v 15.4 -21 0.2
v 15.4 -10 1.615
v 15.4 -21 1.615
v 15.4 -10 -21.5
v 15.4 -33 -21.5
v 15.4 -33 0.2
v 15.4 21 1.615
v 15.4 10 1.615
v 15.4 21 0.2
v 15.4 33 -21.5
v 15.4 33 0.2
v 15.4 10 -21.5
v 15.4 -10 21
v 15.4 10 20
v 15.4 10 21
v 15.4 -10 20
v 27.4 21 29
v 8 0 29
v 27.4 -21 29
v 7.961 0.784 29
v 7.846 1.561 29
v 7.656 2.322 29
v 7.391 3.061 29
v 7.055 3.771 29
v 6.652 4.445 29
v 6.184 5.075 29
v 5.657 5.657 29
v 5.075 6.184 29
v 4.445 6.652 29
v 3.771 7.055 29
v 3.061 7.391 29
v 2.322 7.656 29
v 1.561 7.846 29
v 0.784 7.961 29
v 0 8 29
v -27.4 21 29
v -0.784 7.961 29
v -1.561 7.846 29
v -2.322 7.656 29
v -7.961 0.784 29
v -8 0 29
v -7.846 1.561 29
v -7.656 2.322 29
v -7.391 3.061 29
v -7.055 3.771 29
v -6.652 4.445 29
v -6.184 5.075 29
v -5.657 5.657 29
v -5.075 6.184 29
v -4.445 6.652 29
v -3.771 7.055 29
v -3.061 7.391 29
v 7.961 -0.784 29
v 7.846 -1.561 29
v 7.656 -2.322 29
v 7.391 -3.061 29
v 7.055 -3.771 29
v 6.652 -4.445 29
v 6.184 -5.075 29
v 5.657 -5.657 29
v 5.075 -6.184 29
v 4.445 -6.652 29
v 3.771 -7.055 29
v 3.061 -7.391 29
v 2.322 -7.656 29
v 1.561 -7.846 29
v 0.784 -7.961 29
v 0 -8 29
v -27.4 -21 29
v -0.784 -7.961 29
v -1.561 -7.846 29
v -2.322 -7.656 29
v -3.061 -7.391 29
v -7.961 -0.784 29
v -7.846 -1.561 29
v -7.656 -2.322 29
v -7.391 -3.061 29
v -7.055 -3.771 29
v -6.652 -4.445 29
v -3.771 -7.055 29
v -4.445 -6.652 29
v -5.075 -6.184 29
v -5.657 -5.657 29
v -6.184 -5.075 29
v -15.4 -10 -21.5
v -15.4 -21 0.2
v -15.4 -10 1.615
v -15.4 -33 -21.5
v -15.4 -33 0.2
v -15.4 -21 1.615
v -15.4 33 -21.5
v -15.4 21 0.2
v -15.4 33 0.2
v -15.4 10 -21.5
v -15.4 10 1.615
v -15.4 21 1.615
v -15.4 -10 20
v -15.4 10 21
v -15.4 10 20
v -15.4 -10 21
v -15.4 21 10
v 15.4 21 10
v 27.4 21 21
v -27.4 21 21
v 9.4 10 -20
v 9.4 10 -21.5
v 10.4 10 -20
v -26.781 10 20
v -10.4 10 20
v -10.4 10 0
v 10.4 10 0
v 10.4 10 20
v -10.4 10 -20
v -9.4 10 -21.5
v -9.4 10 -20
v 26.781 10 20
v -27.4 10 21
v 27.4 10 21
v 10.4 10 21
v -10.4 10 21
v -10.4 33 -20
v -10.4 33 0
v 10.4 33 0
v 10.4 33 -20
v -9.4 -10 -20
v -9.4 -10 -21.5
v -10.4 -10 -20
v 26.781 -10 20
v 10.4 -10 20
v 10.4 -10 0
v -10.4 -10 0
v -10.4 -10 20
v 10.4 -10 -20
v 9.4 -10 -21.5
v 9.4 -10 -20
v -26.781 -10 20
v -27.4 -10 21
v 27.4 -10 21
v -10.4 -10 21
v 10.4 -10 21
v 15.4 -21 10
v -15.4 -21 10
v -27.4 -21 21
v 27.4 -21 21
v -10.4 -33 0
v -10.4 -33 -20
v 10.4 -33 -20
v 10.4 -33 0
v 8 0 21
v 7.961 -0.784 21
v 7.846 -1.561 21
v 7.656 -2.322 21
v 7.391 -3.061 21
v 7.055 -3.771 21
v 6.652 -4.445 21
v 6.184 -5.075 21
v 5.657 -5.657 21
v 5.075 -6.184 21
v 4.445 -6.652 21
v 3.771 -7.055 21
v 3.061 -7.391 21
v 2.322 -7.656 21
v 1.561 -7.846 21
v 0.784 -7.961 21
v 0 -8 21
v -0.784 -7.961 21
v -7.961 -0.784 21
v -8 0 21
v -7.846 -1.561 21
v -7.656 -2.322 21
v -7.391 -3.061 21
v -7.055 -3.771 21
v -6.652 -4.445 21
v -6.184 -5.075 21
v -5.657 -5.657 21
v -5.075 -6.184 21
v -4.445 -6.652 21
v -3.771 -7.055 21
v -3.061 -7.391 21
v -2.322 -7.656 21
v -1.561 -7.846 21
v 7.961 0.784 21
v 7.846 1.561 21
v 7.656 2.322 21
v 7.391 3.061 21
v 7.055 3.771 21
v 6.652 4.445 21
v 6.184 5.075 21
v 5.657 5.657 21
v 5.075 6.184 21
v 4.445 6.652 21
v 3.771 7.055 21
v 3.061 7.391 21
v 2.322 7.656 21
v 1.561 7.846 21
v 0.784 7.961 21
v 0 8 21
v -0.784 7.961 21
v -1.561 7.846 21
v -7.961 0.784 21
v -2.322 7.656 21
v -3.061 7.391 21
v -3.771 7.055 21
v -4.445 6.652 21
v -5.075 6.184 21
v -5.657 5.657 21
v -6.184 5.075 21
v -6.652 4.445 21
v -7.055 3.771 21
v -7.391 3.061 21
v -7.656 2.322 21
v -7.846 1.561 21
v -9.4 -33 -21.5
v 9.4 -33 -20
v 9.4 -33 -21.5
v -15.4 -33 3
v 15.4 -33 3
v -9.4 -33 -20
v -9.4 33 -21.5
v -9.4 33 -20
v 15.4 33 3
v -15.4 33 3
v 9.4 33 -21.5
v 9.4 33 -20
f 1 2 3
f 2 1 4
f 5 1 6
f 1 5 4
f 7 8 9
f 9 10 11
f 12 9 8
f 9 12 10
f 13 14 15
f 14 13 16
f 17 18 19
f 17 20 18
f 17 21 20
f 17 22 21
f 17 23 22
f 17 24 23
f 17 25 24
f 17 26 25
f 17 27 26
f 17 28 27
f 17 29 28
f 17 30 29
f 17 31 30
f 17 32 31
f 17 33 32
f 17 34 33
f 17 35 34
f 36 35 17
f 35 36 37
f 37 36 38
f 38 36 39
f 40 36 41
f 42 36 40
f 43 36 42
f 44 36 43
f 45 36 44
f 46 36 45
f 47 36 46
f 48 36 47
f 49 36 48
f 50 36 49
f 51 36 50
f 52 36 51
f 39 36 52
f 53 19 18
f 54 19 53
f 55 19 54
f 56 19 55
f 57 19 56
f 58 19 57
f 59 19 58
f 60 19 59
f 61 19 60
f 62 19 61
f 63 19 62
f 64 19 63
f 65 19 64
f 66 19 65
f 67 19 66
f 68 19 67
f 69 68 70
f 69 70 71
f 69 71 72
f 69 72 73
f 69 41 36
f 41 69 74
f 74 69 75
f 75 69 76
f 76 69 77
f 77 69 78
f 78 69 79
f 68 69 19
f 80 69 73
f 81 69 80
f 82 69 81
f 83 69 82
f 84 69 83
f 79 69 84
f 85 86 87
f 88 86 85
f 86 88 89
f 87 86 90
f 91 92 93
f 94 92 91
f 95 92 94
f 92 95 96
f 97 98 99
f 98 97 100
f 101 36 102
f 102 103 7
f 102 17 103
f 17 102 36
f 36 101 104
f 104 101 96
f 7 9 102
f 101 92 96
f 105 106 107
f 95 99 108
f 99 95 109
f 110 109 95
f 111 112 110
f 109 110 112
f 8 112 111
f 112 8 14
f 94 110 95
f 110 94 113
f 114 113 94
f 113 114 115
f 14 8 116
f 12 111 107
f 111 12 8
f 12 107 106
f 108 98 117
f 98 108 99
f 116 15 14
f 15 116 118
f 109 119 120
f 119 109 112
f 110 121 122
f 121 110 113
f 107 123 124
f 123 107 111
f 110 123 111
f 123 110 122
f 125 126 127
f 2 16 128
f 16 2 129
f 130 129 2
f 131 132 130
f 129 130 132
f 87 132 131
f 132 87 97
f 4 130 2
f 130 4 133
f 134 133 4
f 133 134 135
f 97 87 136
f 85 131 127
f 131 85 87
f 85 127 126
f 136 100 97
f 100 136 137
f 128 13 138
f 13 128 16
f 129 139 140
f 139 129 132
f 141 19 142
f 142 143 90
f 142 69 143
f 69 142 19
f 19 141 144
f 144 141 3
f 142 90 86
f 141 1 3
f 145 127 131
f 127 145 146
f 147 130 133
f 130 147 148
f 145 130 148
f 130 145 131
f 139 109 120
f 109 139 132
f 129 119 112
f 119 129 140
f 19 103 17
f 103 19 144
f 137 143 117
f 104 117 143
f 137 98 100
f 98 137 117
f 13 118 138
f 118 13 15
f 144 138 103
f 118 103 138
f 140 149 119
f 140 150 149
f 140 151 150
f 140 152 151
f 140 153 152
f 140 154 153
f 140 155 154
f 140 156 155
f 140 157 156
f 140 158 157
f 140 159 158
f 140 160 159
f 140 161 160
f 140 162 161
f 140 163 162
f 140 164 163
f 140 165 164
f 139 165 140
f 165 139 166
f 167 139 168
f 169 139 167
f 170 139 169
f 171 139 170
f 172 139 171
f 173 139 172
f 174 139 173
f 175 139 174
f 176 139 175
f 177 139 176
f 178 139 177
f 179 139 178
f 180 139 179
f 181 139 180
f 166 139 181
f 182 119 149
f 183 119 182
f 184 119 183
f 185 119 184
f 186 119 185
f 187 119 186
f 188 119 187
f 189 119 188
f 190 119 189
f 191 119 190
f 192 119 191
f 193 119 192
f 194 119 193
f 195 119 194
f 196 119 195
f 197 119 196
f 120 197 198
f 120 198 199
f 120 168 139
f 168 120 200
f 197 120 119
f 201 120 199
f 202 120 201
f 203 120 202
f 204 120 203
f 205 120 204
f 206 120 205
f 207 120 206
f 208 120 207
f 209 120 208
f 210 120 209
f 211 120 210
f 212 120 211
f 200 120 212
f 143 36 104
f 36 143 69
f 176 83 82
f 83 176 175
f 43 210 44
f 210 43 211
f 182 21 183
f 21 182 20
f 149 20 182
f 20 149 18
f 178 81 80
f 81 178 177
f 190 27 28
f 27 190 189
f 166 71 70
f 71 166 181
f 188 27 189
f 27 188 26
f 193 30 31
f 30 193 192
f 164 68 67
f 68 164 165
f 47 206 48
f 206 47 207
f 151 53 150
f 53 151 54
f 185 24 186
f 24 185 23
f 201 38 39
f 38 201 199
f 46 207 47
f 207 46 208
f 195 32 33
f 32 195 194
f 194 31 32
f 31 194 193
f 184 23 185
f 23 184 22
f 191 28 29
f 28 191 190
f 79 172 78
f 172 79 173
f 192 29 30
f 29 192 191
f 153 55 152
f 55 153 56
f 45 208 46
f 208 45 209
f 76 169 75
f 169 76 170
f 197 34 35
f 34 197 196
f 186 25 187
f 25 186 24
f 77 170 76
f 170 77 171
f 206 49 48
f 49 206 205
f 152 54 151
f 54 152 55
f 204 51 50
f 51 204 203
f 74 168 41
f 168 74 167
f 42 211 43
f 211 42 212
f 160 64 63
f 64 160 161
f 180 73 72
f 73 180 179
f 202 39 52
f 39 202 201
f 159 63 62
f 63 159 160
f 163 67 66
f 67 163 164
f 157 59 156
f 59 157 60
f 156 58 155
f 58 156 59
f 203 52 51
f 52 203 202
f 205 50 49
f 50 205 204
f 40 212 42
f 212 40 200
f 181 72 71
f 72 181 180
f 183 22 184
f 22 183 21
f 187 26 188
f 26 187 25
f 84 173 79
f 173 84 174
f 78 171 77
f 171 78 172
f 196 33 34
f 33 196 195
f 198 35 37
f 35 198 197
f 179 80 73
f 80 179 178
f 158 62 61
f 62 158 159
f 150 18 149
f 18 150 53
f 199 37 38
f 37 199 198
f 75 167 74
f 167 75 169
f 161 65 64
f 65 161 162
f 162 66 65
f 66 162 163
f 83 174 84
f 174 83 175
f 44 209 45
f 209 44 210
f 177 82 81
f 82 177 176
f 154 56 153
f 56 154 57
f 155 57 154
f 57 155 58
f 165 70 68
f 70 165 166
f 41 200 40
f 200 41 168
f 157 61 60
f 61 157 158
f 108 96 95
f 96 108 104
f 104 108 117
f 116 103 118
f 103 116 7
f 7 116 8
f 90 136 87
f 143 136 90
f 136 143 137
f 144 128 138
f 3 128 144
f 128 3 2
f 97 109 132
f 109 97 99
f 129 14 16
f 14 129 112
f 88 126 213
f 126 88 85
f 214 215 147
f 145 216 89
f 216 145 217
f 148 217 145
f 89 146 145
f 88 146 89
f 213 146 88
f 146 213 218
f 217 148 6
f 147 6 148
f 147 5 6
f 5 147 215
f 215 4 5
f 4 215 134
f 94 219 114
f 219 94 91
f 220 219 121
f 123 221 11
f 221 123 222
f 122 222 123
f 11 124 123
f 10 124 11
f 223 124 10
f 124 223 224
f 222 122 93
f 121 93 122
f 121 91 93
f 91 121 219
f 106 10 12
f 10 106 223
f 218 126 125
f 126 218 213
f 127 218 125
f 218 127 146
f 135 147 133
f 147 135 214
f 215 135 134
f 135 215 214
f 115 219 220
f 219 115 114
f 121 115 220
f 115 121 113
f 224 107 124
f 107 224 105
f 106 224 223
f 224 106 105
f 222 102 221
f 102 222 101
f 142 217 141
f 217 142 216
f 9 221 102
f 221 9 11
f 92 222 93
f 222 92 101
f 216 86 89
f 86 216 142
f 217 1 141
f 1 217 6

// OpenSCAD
// file: ../perpendicular-u-joint-guard-v1.3-triangular-corner-fills/candidate_triangular_corner_fills.scad
// Candidate v1.3: four triangular concave-corner fill blocks.
//
// Base: accepted v0.7 eaves12 geometry. v0.9/v1.0/v1.1/v1.2 are not
// imported. Each corner block is a real triangular prism: broad at the roof,
// tapering continuously toward z=0, and overlapping the U side wall.

use <../perpendicular-u-joint-guard-v0.7/perpendicular_double_u_guard.scad>;

$fn = 48;
PART = "candidate_iso";

// Explicit v0.7 interface values.
roof_x_outer = 27.4;       // accepted eaves12 roof: -27.4..+27.4
side_wall_x_outer = 15.4;  // existing side-wall outer edge
blue_tube_x_outer = 10.0;  // blue lower 20x20 tube half-width
plate_y_inner = 10.0;
plate_y_outer = 21.0;
plate_depth_y = plate_y_outer - plate_y_inner; // 11 mm per front/back U plate

// The top edge is 0.5 mm inside the roof volume (roof underside z=21), and
// the lower point enters the side wall by 1 mm in X.  The XZ area therefore
// has positive overlap at both ends, not edge-only contact.
triangle_top_z = 21.5;
triangle_bottom_z = 0.0;
triangle_roof_overlap_z = triangle_top_z - 21.0;
triangle_side_overlap_x = 1.0;
triangle_inner_x = side_wall_x_outer - triangle_side_overlap_x; // 14.4

// Bottom retaining-hook contract copied from v0.7 for explicit verification.
hook_height_z = 1.5;
u_bottom_z = -21.0;
hook_top_z = u_bottom_z + hook_height_z; // -19.5

assert(plate_depth_y == 11, "每个三角块的前后板深必须是 11 mm");
assert(triangle_top_z > 21 && triangle_bottom_z == 0,
       "三角块上端必须搭入屋檐、下端落到 z=0");
assert(triangle_inner_x > blue_tube_x_outer,
       "三角块下端不得进入蓝色方管 x=-10..+10 包络");
assert(triangle_side_overlap_x > 0 && triangle_roof_overlap_z > 0,
       "三角块必须与屋檐和侧墙都有正重叠");
assert(hook_height_z == 1.5 && u_bottom_z == -21 && hook_top_z == -19.5,
       "底部卡脚必须保持 z=-21..-19.5");

// A polygon in XZ is extruded only through the corresponding front/back U
// plate. The center y=-10..+10 passage remains open.
module triangular_fill_xz(points, yc) {
    translate([0, yc, 0])
        rotate([90, 0, 0])
            linear_extrude(height = plate_depth_y,
                           center = true,
                           convexity = 10)
                polygon(points = points);
}

module front_neg_x_triangle() {
    // -X roof end -> +X inward. Top wide, lower point at the side wall.
    triangular_fill_xz([
        [-roof_x_outer, 21.0],
        [-triangle_inner_x, triangle_top_z],
        [-triangle_inner_x, triangle_bottom_z]
    ], (plate_y_inner + plate_y_outer) / 2);
}

module front_pos_x_triangle() {
    // +X roof end -> -X inward. Mirrored triangle.
    triangular_fill_xz([
        [roof_x_outer, 21.0],
        [triangle_inner_x, triangle_top_z],
        [triangle_inner_x, triangle_bottom_z]
    ], (plate_y_inner + plate_y_outer) / 2);
}

module back_neg_x_triangle() {
    triangular_fill_xz([
        [-roof_x_outer, 21.0],
        [-triangle_inner_x, triangle_top_z],
        [-triangle_inner_x, triangle_bottom_z]
    ], -(plate_y_inner + plate_y_outer) / 2);
}

module back_pos_x_triangle() {
    triangular_fill_xz([
        [roof_x_outer, 21.0],
        [triangle_inner_x, triangle_top_z],
        [triangle_inner_x, triangle_bottom_z]
    ], -(plate_y_inner + plate_y_outer) / 2);
}

module front_two_triangular_fills() {
    union() {
        front_neg_x_triangle();
        front_pos_x_triangle();
    }
}

module back_two_triangular_fills() {
    union() {
        back_neg_x_triangle();
        back_pos_x_triangle();
    }
}

module all_four_triangular_fills() {
    union() {
        front_two_triangular_fills();
        back_two_triangular_fills();
    }
}

module candidate_print_solid() {
    // Final hole operation is deliberately after the complete four-block
    // union; this preserves a true Z through-hole and the round nut pocket.
    difference() {
        union() {
            double_u_clip();
            all_four_triangular_fills();
        }
        vertical_screw_relief();
    }
}

module candidate_clip() {
    candidate_print_solid();
}

module candidate_assembly_iso() {
    upper_long_tube();
    lower_cross_tube();
    color([0.96, 0.39, 0.08]) double_u_clip();
    color([0.86, 0.13, 0.08]) front_two_triangular_fills();
    color([0.62, 0.12, 0.52]) back_two_triangular_fills();
    vertical_joint_screw();
}

module candidate_front_xz() {
    lower_cross_tube();
    color([0.96, 0.39, 0.08]) double_u_clip();
    color([0.86, 0.13, 0.08]) front_two_triangular_fills();
    vertical_joint_screw();
}

module candidate_back_xz() {
    lower_cross_tube();
    color([0.96, 0.39, 0.08]) double_u_clip();
    color([0.62, 0.12, 0.52]) back_two_triangular_fills();
    vertical_joint_screw();
}

module candidate_top_slice() {
    // At z=-0.5..2.5 the four blocks show their two front/back 11 mm bands;
    // the blue tube and the central y gap remain visible.
    slice_box = 200;
    color([0.28, 0.45, 0.78])
        intersection() {
            lower_cross_tube();
            translate([-slice_box / 2, -slice_box / 2, -0.5])
                cube([slice_box, slice_box, 3.0]);
        }
    color([0.96, 0.39, 0.08])
        intersection() {
            double_u_clip();
            translate([-slice_box / 2, -slice_box / 2, -0.5])
                cube([slice_box, slice_box, 3.0]);
        }
    color([0.86, 0.13, 0.08])
        intersection() {
            front_two_triangular_fills();
            translate([-slice_box / 2, -slice_box / 2, -0.5])
                cube([slice_box, slice_box, 3.0]);
        }
    color([0.62, 0.12, 0.52])
        intersection() {
            back_two_triangular_fills();
            translate([-slice_box / 2, -slice_box / 2, -0.5])
                cube([slice_box, slice_box, 3.0]);
        }
}

module candidate_hole_section() {
    // Center y=0 section: the bore and round nut pocket are shown without
    // confusing them with the bottom hook, which is outside this section.
    intersection() {
        candidate_print_solid();
        translate([-100, -0.4, -100]) cube([200, 0.8, 200]);
    }
}

module candidate_hook_check() {
    // Isolated lower detail: exact imported v0.7 U plate and blue tube, with
    // hook volumes highlighted only for review. This is not the print union.
    detail_box = 200;
    detail_z0 = -22;
    detail_h = 5;
    detail_y0 = 8;
    detail_ydepth = 15;
    intersection() {
        lower_cross_tube();
        translate([-detail_box / 2, detail_y0, detail_z0])
            cube([detail_box, detail_ydepth, detail_h]);
    }
    color([0.96, 0.39, 0.08])
        intersection() {
            u_plate(plate_y_inner, plate_y_outer);
            translate([-detail_box / 2, detail_y0, detail_z0])
                cube([detail_box, detail_ydepth, detail_h]);
        }
    color([0.20, 0.78, 0.20])
        intersection() {
            union() {
                translate([-13.65, 15.5, -20.25])
                    cube([3.5, 11, 1.5], center = true);
                translate([13.65, 15.5, -20.25])
                    cube([3.5, 11, 1.5], center = true);
            }
            translate([-detail_box / 2, detail_y0, detail_z0])
                cube([detail_box, detail_ydepth, detail_h]);
        }
}

if (PART == "candidate_clip") {
    candidate_clip();
} else if (PART == "candidate_front_xz") {
    candidate_front_xz();
} else if (PART == "candidate_back_xz") {
    candidate_back_xz();
} else if (PART == "candidate_top_slice") {
    candidate_top_slice();
} else if (PART == "candidate_hole_section") {
    candidate_hole_section();
} else if (PART == "candidate_hook_check") {
    candidate_hook_check();
} else {
    candidate_assembly_iso();
}
// file: ../perpendicular-u-joint-guard-v1.8-lower-20plus1p5/lower_20plus1p5_guard.scad
// v1.8, mm. Rebuild the WHOLE lower U profile to the explicit 20+1.5 rule.
// Physical blue tube z=-20..0; contact wall height=20; inward lip below it
// z=-21.5..-20. No legacy u_bottom=-21 / lip top=-19.5 in the rebuilt lower.
use <../perpendicular-u-joint-guard-v1.5-vertical-tube-clearance/vertical_tube_clearance_guard.scad>;
use <../perpendicular-u-joint-guard-v1.4-full-nut-passage/full_nut_passage_guard.scad>;

$fn=48;
tube_size=20;
tube_top_z=0;
tube_bottom_z=tube_top_z-tube_size; // -20
lip_thickness_z=1.5;
lower_bottom_z=tube_bottom_z-lip_thickness_z; // -21.5
wall_thickness_x=5;
u_clearance_x=0.8;
inner_width_x=tube_size+u_clearance_x; // 20.8
outer_width_x=inner_width_x+2*wall_thickness_x; // 30.8
hook_depth_x=3.5;
u_inner_y=10;
u_outer_y=33; // original 21 + 12 mm along BLUE tube Y
upper_joint_overlap_z=0.1;

assert(tube_top_z-lower_bottom_z==21.5, "下部总高应为20+1.5=21.5 mm");
assert(2*u_inner_y==20, "中央Y通道应保持20 mm");

module upper_v1_5_preserved() {
    // Keep the accepted upper body. The 0.1 mm overlap is entirely within
    // the original arm footprint, ensuring a solid join without changing
    // the final upper shape or extending the new Y segments above z=0.
    intersection() {
        guard_v1_5();
        translate([-60,-60,-upper_joint_overlap_z])
            cube([120,120,70]);
    }
}

module lower_u_hooks() {
    // Same hook_depth_x, wall and X-clearance logic as the source v0.7 U.
    // Only Z is deliberately corrected to the new user's 20+1.5 definition.
    hook_xc=outer_width_x/2-wall_thickness_x/2-hook_depth_x/2; // 11.15
    for(yc=[-(u_inner_y+u_outer_y)/2,(u_inner_y+u_outer_y)/2])
        for(s=[-1,1])
            translate([s*hook_xc,yc,tube_bottom_z-lip_thickness_z/2])
                cube([hook_depth_x,u_outer_y-u_inner_y,lip_thickness_z],center=true);
}

module rebuilt_lower_u_pair() {
    wall_xc=inner_width_x/2+wall_thickness_x/2; // 12.9
    for(yc=[-(u_inner_y+u_outer_y)/2,(u_inner_y+u_outer_y)/2])
        for(s=[-1,1])
            translate([s*wall_xc,yc,(lower_bottom_z+tube_top_z)/2])
                cube([wall_thickness_x,u_outer_y-u_inner_y,
                      tube_top_z-lower_bottom_z],center=true);
    lower_u_hooks();
}

module guard_v1_8() {
    difference() {
        union() {
            upper_v1_5_preserved();
            rebuilt_lower_u_pair();
        }
        full_depth_nut_passage();
        upper_pipe_vertical_entry_slot();
    }
}

guard_v1_8();
// file: ../perpendicular-u-joint-guard-v1.4-full-nut-passage/full_nut_passage_guard.scad
// v1.4: keep the exact v1.3 body; remove the nut-pocket floor with one
// full-depth Ø16 cylindrical subtraction. Units: mm; Z positive upwards.
// Imported v1.3 geometry contains all four triangles and the lower hooks.
use <../perpendicular-u-joint-guard-v1.3-triangular-corner-fills/candidate_triangular_corner_fills.scad>;

$fn = 48;
PART = "clip";
nut_passage_d = 16.0;

module full_depth_nut_passage() {
    // Cutter extends z=-31..39, past the whole printed z=-21..29 envelope.
    // 64 facets match the existing Ø16 pocket, avoiding a stepped profile.
    translate([0, 0, 4])
        cylinder(d = nut_passage_d, h = 70, center = true, $fn = 64);
}

module guard_v1_4() {
    difference() {
        candidate_print_solid();
        full_depth_nut_passage();
    }
}

guard_v1_4();
// file: ../perpendicular-u-joint-guard-v1.5-vertical-tube-clearance/vertical_tube_clearance_guard.scad
// v1.5: v1.4 Ø16 full nut passage + minimum downward-entry upper-tube slot.
// Units mm. X: upper long tube; Y: blue foot/front-back; Z: up.
use <../perpendicular-u-joint-guard-v1.4-full-nut-passage/full_nut_passage_guard.scad>;

$fn = 48;

module upper_pipe_vertical_entry_slot() {
    // Fixed gray upper tube: x=-60..60, y=-10..10, z=0..20.
    // While the clip moves down, that tube sweeps upward in clip coordinates.
    // A bottom-open slot ending at z=20 covers its whole relevant sweep in
    // the printed z=-21..29 envelope. Roof underside remains at z=21.
    // Preserve exact 20 mm Y width rather than silently adding fit clearance.
    translate([-60, -10, -31]) cube([120, 20, 51]);
}

module guard_v1_5() {
    difference() {
        guard_v1_4();
        upper_pipe_vertical_entry_slot();
    }
}

guard_v1_5();
// file: ../perpendicular-u-joint-guard-v1.9-mirrored-end-ramps/mirrored_end_ramps_guard.scad
// v1.9, mm: two Y-mirrored solid end ramps on the accepted v1.8 lower U.
// Blue tube top is z=0; ramp root |y|=21 rises 10 mm, tip |y|=33 rises 3 mm.
use <../perpendicular-u-joint-guard-v1.8-lower-20plus1p5/lower_20plus1p5_guard.scad>;
use <../perpendicular-u-joint-guard-v1.5-vertical-tube-clearance/vertical_tube_clearance_guard.scad>;
use <../perpendicular-u-joint-guard-v1.4-full-nut-passage/full_nut_passage_guard.scad>;

$fn=48;
ramp_root_y=21;
ramp_tip_y=33;
ramp_root_z=10;
ramp_tip_z=3;
u_inner_half_x=10.4; // v1.8 X inner width 20.8
ramp_sidewall_overlap_x=1;
ramp_half_x=u_inner_half_x+ramp_sidewall_overlap_x; // 11.4 / width 22.8
ramp_root_overlap_y=0.2;
ramp_joint_overlap_z=0.2;

module positive_end_ramp_prism() {
    // Local XY polygon is the physical YZ contour; extrusion maps to X.
    // The visible 21..33 interval is exactly a trapezoid: 10 -> 3 mm.
    // A hidden 0.2 mm root lap holds the 10 mm height inside the old body.
    rotate([90,0,90])
        linear_extrude(height=2*ramp_half_x,center=true,convexity=10)
            polygon(points=[
                [ramp_root_y-ramp_root_overlap_y,0],
                [ramp_tip_y,0],
                [ramp_tip_y,ramp_tip_z],
                [ramp_root_y,ramp_root_z],
                [ramp_root_y-ramp_root_overlap_y,ramp_root_z]
            ]);
}

module ramp_prisms_pair() {
    positive_end_ramp_prism();
    mirror([0,1,0]) positive_end_ramp_prism();
}

module sidewall_join_keys() {
    // Volumetric joins at both supporting side walls. The z<0 halves lie
    // entirely inside the existing v1.8 arms, so the lower geometry does not
    // change. Contact width is 1 mm in X on each side, over all 12 mm of Y.
    for(s=[-1,1]) for(y0=[-ramp_tip_y,ramp_root_y])
        translate([s*(u_inner_half_x+ramp_sidewall_overlap_x/2),
                   y0+(ramp_tip_y-ramp_root_y)/2,0])
            cube([ramp_sidewall_overlap_x,ramp_tip_y-ramp_root_y,
                  2*ramp_joint_overlap_z],center=true);
}

module mirrored_end_reinforcement() {
    ramp_prisms_pair();
    sidewall_join_keys();
}

module guard_v1_9() {
    difference() {
        union() { guard_v1_8(); mirrored_end_reinforcement(); }
        full_depth_nut_passage();
        upper_pipe_vertical_entry_slot();
    }
}

guard_v1_9();
// main file
// v1.10, mm. X=gray tube; Y=blue foot; Z=up.
// Only widen the v1.9 ramps in X to cover the entire 5 mm side walls.
// Preserve both YZ ramp profiles, downward installation and elastic lips.
use <../perpendicular-u-joint-guard-v1.9-mirrored-end-ramps/mirrored_end_ramps_guard.scad>;
use <../perpendicular-u-joint-guard-v1.5-vertical-tube-clearance/vertical_tube_clearance_guard.scad>;
use <../perpendicular-u-joint-guard-v1.4-full-nut-passage/full_nut_passage_guard.scad>;

$fn=48;
inner_half_x=10.4;
wall_x=5;
outer_half_x=inner_half_x+wall_x; // 15.4; final ramp width 30.8
v1_9_ramp_width_x=22.8;

module full_wall_width_ramps() {
    // Reuse the actual accepted paired profiles, transform X only.
    scale([2*outer_half_x/v1_9_ramp_width_x,1,1]) ramp_prisms_pair();
    // Positive-volume joins across the full wall top. Below Z=0 these
    // keys are wholly inside the existing walls, not new lip geometry.
    for(s=[-1,1]) for(yc=[-27,27])
        translate([s*(inner_half_x+wall_x/2),yc,0])
            cube([wall_x,12,0.4],center=true);
}

module guard_v1_10() {
    difference() {
        union() { guard_v1_9(); full_wall_width_ramps(); }
        full_depth_nut_passage();
        upper_pipe_vertical_entry_slot();
    }
}

guard_v1_10();
